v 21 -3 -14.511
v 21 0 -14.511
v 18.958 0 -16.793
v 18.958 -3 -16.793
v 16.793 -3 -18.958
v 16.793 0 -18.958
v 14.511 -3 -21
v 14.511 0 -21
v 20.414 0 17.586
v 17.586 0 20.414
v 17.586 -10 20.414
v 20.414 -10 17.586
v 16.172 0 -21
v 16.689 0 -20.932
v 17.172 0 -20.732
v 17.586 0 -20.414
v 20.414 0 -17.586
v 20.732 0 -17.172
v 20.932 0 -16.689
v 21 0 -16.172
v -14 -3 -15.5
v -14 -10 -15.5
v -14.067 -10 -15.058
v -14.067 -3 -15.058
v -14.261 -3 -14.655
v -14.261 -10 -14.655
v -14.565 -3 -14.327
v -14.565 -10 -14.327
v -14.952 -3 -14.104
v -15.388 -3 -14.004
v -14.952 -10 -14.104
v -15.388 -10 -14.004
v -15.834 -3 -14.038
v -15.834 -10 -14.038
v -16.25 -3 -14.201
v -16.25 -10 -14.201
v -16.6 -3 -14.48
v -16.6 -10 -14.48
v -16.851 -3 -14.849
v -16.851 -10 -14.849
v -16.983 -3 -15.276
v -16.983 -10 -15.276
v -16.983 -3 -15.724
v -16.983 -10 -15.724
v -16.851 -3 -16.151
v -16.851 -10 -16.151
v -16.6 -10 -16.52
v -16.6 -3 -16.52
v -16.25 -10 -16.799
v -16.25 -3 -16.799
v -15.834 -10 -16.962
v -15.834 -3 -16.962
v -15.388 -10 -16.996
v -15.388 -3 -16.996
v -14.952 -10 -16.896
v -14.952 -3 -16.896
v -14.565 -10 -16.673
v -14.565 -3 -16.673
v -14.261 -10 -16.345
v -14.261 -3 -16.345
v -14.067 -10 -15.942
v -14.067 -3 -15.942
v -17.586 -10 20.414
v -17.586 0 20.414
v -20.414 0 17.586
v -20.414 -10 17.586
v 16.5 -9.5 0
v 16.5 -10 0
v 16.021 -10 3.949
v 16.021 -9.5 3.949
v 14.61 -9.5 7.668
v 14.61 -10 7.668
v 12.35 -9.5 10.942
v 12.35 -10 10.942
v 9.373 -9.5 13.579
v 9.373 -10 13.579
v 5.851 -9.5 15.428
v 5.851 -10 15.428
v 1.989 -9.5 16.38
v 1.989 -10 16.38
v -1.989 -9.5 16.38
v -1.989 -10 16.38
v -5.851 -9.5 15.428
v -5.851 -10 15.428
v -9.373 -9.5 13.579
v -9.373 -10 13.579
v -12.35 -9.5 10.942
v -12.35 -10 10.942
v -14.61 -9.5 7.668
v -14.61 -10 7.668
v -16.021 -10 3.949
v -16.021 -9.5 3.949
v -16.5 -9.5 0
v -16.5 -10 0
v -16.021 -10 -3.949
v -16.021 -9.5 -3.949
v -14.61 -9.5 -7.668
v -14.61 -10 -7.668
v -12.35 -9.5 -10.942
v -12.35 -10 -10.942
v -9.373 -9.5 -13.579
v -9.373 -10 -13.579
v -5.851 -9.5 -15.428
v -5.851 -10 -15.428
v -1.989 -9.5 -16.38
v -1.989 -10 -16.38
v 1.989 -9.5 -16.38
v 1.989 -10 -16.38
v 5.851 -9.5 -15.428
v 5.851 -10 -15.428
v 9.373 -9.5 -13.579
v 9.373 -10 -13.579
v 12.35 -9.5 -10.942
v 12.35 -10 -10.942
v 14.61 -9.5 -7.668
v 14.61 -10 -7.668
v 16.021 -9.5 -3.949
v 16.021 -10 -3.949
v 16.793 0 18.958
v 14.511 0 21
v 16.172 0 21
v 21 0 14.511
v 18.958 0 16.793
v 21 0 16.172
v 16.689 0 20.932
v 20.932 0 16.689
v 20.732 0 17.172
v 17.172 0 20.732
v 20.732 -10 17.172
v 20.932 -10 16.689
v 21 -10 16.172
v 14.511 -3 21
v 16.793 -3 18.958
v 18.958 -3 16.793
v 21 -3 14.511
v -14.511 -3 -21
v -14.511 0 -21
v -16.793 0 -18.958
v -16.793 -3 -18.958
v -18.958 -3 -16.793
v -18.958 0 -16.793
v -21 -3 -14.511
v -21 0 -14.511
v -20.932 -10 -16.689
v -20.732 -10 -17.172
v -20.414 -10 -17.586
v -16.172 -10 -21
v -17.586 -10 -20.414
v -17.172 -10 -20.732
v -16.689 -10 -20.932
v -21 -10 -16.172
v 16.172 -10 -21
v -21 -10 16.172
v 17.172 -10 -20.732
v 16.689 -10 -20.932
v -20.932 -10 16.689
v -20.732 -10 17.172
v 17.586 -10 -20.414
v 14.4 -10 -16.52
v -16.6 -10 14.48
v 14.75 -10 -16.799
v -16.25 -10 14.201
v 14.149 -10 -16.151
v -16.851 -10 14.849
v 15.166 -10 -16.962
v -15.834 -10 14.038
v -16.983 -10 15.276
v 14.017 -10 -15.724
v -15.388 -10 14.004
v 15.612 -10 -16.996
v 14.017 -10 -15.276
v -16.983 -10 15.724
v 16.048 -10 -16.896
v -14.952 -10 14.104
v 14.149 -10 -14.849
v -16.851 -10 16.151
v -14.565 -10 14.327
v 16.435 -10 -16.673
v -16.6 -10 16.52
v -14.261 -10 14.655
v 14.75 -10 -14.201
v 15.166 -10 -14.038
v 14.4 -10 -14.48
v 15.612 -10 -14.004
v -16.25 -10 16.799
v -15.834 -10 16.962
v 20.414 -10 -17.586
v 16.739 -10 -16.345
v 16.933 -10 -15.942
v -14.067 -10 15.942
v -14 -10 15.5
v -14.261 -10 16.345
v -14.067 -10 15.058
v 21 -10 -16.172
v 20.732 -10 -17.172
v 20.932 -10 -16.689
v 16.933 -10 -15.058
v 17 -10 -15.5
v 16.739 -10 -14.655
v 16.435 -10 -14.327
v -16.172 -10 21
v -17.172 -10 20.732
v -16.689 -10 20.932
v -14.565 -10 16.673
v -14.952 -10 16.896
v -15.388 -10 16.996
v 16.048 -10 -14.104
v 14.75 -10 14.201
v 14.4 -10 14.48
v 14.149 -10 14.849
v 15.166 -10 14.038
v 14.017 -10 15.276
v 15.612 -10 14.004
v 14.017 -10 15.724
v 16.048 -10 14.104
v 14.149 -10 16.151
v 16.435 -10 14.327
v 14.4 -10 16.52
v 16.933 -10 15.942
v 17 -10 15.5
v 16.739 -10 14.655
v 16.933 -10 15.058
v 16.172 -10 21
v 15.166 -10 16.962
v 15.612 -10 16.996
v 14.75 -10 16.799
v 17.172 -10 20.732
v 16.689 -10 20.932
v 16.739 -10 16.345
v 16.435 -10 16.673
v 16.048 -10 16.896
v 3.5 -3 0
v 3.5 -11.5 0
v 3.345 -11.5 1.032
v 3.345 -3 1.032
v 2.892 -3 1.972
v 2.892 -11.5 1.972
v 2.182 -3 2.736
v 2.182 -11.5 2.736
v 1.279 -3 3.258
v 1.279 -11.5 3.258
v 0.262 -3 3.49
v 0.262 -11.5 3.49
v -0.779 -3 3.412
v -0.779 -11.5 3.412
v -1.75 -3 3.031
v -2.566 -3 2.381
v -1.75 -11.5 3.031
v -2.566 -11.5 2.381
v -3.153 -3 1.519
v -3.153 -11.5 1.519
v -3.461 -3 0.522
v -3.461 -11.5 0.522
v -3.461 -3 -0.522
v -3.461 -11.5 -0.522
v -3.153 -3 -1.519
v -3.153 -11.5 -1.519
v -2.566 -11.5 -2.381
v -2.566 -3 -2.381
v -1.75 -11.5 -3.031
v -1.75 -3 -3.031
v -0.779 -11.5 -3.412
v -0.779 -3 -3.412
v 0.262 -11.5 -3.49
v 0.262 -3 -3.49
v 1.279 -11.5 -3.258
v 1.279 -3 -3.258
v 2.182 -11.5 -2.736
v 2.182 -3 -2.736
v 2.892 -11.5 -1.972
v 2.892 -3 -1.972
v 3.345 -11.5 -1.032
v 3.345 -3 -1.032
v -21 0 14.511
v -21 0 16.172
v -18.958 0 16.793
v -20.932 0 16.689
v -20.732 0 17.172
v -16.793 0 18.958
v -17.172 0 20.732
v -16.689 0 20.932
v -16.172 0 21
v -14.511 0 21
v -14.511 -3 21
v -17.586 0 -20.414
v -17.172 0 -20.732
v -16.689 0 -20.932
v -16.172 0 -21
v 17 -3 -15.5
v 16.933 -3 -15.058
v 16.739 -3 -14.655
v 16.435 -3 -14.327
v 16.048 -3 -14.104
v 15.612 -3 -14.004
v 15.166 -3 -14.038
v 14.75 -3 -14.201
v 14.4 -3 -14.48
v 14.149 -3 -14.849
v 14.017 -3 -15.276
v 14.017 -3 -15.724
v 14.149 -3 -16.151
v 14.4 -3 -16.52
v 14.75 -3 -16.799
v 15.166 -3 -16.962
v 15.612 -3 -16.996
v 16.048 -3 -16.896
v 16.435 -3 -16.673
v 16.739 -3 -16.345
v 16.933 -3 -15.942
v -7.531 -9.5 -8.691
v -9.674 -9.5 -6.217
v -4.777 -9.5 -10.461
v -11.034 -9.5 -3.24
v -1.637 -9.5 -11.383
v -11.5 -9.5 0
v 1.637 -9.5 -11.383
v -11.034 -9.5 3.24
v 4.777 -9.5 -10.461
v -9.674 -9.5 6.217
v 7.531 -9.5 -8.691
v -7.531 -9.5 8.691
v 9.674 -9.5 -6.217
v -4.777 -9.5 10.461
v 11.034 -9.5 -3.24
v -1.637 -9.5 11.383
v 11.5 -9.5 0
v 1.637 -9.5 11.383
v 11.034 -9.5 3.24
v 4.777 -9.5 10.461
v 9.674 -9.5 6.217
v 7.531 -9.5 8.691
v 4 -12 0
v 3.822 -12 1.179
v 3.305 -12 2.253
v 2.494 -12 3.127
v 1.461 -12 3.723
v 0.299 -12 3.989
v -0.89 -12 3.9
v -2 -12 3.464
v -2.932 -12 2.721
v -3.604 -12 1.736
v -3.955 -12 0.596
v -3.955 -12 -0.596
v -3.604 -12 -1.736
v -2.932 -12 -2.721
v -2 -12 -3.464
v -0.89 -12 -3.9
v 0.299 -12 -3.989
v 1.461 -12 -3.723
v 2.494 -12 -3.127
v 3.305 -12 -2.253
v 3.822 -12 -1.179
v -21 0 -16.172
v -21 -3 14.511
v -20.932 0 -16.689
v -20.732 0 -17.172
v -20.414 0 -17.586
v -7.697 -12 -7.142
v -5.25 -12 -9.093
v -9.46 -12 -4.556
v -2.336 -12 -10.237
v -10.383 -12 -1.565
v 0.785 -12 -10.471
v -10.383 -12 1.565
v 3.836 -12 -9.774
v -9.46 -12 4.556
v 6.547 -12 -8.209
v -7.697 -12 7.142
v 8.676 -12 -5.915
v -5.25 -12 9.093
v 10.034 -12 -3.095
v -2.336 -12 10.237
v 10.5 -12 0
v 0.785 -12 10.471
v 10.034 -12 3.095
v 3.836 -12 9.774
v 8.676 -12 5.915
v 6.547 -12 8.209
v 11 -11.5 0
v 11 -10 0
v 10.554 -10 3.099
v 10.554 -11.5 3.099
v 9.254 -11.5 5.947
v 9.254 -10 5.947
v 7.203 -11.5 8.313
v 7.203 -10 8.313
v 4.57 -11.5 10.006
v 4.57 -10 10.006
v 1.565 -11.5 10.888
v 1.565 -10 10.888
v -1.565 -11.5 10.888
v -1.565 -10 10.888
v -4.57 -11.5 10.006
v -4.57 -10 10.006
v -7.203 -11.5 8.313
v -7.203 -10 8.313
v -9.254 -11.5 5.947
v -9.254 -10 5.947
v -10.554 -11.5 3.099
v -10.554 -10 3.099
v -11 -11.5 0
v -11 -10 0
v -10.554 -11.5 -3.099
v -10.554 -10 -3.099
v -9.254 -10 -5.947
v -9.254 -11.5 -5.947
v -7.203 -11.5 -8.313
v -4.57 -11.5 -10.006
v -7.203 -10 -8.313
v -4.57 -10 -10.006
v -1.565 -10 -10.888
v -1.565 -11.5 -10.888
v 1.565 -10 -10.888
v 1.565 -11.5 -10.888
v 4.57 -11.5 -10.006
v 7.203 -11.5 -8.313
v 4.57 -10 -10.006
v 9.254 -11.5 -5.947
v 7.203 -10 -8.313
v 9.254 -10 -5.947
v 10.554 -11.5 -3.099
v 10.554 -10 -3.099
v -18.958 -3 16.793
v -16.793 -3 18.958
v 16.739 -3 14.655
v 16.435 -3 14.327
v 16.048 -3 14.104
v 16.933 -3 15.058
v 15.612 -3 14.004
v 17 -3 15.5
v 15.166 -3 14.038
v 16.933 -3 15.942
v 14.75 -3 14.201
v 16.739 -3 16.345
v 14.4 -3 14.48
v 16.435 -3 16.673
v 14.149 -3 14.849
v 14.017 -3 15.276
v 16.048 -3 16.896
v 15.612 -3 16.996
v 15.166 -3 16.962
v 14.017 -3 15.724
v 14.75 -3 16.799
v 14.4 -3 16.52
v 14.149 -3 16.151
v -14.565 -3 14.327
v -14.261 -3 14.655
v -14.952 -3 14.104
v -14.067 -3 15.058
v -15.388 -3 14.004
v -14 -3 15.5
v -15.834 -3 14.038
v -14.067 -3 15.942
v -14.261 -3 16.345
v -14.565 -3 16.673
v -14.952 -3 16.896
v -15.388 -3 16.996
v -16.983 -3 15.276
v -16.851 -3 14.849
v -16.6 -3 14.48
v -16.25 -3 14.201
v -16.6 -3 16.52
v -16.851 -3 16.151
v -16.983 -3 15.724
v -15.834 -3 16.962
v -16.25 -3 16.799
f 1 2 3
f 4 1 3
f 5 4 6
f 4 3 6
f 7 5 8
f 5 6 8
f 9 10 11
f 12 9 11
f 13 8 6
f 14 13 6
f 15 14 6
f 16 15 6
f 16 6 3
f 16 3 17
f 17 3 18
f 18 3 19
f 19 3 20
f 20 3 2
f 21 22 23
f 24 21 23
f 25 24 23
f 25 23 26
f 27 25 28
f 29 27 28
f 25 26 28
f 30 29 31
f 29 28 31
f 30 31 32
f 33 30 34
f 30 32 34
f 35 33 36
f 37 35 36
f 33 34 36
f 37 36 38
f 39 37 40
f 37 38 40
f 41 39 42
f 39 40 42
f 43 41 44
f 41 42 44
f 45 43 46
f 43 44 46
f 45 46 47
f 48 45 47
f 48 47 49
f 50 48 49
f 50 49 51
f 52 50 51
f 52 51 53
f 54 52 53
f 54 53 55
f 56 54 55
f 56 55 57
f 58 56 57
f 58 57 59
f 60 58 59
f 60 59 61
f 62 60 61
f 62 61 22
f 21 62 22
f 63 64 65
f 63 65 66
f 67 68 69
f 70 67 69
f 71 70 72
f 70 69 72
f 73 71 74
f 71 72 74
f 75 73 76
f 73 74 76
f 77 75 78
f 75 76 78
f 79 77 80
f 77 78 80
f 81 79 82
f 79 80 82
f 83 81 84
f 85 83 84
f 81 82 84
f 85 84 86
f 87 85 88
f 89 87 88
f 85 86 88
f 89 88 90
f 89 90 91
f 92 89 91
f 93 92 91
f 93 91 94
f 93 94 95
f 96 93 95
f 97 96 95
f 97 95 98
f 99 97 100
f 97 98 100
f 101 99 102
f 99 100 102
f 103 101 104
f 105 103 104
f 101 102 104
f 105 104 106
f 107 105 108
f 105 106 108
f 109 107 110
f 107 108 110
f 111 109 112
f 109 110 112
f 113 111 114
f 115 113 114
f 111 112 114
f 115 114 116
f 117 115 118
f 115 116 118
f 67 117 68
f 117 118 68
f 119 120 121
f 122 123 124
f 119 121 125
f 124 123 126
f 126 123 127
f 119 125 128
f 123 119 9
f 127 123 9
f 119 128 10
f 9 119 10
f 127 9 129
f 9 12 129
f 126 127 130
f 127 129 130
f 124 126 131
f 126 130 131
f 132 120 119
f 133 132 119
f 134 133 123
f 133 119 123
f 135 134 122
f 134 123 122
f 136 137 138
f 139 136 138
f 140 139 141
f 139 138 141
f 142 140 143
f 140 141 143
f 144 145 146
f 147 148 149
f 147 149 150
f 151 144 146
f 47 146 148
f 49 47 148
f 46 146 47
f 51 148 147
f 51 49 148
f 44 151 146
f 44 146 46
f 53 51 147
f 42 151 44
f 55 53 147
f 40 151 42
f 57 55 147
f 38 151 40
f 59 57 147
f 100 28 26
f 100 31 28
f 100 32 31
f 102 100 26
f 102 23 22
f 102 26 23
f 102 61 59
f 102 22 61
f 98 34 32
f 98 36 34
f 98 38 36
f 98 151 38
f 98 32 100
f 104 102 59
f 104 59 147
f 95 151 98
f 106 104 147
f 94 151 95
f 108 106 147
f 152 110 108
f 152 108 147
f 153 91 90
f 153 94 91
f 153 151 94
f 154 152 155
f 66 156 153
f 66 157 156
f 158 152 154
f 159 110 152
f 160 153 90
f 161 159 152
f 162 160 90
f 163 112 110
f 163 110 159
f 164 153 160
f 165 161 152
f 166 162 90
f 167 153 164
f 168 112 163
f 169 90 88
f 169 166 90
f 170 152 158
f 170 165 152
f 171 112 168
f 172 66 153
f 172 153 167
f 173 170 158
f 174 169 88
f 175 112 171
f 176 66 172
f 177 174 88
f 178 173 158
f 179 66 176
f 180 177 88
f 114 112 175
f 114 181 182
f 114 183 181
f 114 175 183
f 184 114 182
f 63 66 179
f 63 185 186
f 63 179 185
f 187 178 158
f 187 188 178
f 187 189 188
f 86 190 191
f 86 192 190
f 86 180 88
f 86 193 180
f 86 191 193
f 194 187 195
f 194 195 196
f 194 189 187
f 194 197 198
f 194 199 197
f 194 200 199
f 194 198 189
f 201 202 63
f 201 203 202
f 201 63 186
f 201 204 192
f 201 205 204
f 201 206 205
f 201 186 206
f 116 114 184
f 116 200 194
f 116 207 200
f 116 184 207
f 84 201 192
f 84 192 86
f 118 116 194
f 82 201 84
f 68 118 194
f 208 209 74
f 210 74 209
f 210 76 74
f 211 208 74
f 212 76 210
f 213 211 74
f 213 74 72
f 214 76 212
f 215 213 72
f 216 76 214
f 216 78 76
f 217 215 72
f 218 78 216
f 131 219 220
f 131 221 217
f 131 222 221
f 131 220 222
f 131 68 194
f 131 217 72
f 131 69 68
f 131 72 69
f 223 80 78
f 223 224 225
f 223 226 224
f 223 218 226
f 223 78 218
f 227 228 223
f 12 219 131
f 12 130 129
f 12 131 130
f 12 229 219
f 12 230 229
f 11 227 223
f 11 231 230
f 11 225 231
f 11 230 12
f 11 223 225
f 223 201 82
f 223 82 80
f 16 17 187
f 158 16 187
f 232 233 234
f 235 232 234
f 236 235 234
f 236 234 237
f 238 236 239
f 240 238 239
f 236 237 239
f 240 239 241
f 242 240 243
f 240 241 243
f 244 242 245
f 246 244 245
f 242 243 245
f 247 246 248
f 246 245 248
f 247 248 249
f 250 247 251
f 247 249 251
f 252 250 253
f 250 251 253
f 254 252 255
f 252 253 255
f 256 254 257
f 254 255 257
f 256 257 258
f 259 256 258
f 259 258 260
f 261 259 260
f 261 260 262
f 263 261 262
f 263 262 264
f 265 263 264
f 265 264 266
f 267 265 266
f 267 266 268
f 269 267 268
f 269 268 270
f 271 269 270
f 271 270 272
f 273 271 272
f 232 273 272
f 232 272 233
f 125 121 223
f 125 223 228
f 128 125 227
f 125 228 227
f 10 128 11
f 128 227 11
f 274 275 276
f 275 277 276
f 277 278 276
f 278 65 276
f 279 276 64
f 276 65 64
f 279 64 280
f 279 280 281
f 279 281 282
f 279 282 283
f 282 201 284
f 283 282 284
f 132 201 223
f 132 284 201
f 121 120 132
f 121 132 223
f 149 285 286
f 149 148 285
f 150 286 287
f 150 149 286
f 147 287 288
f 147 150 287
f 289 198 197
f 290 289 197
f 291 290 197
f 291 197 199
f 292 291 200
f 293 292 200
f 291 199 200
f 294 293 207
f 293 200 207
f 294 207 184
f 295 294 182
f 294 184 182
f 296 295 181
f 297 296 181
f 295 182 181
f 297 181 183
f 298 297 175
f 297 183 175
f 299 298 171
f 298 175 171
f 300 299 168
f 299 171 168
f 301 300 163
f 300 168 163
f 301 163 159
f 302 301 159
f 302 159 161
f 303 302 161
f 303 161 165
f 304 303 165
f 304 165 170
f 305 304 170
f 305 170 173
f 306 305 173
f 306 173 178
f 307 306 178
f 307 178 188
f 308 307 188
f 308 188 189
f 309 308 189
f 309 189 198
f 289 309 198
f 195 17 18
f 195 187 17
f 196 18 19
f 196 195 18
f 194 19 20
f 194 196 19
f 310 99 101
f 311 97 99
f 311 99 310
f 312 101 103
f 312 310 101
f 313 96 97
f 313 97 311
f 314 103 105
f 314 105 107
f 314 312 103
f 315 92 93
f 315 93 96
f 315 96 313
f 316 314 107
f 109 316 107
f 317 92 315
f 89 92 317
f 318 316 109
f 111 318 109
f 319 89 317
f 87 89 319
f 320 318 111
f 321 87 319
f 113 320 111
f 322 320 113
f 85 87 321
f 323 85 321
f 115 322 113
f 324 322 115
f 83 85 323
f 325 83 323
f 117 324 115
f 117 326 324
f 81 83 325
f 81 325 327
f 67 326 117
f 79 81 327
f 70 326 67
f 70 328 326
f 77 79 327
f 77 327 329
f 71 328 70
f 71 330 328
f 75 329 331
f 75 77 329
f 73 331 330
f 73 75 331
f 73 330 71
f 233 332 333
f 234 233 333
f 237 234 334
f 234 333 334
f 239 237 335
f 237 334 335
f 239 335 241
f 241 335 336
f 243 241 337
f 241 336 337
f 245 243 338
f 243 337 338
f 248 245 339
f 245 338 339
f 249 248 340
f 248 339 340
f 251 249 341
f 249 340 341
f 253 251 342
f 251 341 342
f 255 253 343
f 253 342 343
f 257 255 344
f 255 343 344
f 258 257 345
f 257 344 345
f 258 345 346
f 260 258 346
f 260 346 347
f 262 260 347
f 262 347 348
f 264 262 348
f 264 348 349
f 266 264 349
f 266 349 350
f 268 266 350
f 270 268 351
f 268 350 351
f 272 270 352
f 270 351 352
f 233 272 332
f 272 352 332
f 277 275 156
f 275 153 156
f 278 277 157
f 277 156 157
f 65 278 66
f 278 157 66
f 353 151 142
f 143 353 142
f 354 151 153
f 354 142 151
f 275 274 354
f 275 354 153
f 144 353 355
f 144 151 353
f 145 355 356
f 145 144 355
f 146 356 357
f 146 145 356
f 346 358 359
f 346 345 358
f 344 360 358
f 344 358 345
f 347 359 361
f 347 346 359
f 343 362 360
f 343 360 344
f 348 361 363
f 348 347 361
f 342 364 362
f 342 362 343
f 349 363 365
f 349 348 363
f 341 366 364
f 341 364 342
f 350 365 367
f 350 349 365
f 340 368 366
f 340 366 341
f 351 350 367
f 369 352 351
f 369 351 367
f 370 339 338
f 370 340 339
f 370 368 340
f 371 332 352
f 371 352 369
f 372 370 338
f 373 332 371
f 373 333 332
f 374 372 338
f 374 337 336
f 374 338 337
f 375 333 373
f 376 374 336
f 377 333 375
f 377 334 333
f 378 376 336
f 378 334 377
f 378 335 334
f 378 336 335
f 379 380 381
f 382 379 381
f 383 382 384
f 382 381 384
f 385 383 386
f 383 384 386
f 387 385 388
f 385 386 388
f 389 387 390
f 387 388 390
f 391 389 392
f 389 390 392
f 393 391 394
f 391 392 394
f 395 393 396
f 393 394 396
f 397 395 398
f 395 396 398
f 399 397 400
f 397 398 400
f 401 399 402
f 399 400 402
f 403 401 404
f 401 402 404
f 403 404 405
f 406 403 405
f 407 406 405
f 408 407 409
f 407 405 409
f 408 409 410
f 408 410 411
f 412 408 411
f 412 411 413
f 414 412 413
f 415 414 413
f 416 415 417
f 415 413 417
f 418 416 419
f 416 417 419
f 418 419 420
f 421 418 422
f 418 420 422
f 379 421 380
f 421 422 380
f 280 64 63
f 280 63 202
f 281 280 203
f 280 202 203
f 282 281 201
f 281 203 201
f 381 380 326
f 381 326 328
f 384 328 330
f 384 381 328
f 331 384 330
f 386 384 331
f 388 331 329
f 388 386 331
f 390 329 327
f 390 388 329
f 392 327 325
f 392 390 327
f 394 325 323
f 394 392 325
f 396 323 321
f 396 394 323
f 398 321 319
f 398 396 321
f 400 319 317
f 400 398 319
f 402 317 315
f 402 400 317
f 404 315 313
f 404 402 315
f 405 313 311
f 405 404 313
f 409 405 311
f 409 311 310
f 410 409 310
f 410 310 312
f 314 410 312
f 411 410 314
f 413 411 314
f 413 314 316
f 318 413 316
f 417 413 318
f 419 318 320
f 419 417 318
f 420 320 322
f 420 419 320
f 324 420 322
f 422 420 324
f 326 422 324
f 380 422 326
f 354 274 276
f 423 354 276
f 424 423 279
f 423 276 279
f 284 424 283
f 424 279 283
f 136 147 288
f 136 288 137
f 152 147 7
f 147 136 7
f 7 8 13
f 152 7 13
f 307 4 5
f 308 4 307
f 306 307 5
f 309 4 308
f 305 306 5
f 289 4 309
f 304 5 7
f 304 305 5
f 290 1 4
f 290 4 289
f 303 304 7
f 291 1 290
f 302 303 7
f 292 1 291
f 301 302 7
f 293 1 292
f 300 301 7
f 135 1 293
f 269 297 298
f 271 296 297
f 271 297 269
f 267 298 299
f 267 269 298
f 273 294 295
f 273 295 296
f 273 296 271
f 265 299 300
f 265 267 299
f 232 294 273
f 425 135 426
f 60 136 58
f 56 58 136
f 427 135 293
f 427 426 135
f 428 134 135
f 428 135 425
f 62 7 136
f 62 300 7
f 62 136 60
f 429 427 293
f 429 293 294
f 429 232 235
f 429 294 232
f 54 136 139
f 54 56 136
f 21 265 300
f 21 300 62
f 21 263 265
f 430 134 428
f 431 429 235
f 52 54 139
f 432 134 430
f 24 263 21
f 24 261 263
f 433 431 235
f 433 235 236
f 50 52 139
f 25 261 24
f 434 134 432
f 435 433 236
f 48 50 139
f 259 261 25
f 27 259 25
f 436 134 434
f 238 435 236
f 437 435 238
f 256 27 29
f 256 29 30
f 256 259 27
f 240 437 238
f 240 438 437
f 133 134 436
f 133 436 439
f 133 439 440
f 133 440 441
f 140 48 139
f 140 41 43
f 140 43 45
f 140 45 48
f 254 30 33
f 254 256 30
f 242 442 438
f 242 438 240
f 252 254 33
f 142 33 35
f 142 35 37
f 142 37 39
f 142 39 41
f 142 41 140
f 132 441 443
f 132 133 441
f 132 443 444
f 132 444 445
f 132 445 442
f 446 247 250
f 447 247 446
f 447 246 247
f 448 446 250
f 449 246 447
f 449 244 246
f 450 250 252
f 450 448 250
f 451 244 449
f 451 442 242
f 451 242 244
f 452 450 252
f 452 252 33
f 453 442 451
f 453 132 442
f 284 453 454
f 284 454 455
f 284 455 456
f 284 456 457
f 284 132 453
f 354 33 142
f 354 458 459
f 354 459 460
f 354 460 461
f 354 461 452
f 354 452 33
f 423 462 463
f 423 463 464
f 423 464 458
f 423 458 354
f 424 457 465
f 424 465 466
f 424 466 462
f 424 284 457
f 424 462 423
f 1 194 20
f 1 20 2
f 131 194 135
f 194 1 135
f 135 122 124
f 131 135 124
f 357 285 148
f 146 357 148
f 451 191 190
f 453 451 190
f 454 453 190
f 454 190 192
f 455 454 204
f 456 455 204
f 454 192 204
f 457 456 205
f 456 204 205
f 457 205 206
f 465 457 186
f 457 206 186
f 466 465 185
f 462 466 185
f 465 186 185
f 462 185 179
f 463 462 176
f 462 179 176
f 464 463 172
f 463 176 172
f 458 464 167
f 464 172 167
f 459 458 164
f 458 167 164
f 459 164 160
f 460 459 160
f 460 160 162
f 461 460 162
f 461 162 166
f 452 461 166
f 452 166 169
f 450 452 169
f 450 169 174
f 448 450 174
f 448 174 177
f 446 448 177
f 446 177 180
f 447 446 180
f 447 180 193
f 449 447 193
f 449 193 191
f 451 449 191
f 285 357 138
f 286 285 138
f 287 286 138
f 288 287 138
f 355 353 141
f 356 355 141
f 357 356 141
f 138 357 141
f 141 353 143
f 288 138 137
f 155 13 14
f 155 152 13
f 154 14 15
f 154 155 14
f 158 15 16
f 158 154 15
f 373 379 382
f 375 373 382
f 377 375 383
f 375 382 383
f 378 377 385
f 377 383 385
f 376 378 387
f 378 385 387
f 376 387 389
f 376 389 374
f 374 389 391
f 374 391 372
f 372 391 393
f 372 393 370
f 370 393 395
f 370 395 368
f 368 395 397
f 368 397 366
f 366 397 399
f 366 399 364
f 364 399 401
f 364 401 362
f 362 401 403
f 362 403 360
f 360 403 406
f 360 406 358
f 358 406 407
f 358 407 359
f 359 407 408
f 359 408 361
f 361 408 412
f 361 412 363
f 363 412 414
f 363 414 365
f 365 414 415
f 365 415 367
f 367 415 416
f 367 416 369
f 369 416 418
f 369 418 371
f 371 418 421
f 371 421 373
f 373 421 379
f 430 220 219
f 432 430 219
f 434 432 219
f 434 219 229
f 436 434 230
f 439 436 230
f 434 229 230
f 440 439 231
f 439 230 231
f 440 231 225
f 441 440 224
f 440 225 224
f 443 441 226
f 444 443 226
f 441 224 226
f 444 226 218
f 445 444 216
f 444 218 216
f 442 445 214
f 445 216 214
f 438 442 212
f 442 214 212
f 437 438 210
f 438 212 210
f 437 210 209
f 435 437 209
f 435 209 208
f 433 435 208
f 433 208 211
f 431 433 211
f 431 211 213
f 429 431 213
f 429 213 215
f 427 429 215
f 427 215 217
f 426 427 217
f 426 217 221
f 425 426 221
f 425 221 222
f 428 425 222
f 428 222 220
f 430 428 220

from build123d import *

# Parameters (mm, degrees)
F0_W      = 42
F0_H      = 42
F1_DEPTH  = 10
F2_SIZE   = 4
F3_R      = 16.5
F4_DEPTH  = 0.5
F5_R      = 11
F6_DEPTH  = 2.5
F7_R      = 3.5
F8_DEPTH  = 12.001
F9_R      = 2
F10_SIZE  = 0.5
F12_DEPTH = 3
F13_R     = 1.5
F14_DEPTH = 10.001


with BuildPart() as f1:
    # F0 (on Front) → F1 (new body)
    with BuildSketch(Plane.XZ):
        Rectangle(F0_W, F0_H)
    extrude(amount=F1_DEPTH)

    # F2
    f2_edges = [f1.edges().sort_by_distance(p)[0] for p in [
        (-21, -5, 21),
        (21, -5, 21),
        (21, -5, -21),
        (-21, -5, -21),
    ]]
    chamfer(f2_edges, length=F2_SIZE)

    # F3 (on face) → F4 (cut)
    with BuildSketch(Plane.XZ.offset(10)):
        Circle(F3_R)
    extrude(amount=-F4_DEPTH, mode=Mode.SUBTRACT)

    # F5 (on face) → F6 (join)
    with BuildSketch(Plane.XZ.offset(9.5)):
        Circle(F5_R)
    extrude(amount=F6_DEPTH)

    # F7 (on face) → F8 (cut, through all)
    with BuildSketch(Plane.XZ.offset(12)):
        Circle(F7_R)
    extrude(amount=-F8_DEPTH, mode=Mode.SUBTRACT)

    # F9
    f9_edges = [f1.edges().sort_by_distance(p)[0] for p in [
        (-17, -5, 21),
        (17, -5, 21),
        (21, -5, 17),
        (21, -5, -17),
        (17, -5, -21),
        (-17, -5, -21),
        (-21, -5, -17),
        (-21, -5, 17),
    ]]
    fillet(f9_edges, radius=F9_R)

    # F10
    f10_edges = [f1.edges().sort_by_distance(p)[0] for p in [
        (-11, -12, 0),
        (-3.5, -12, 0),
        (-11, -9.5, 0),
    ]]
    chamfer(f10_edges, length=F10_SIZE)

    # F11 (on face) → F12 (cut)
    with BuildSketch(Plane(origin=(0, 0, 0), x_dir=(-1, 0, 0), z_dir=(0, 1, 0))):
        with BuildLine():
            ThreePointArc((-14.5105618091, 21), (-17.8908729653, 17.8908729653), (-21, 14.5105618091))
            Line((-21, 14.5105618091), (-21, -14.5105618091))
            ThreePointArc((-21, -14.5105618091), (-17.8908729653, -17.8908729653), (-14.5105618091, -21))
            Line((-14.5105618091, -21), (14.5105618091, -21))
            ThreePointArc((14.5105618091, -21), (17.8908729653, -17.8908729653), (21, -14.5105618091))
            Line((21, -14.5105618091), (21, 14.5105618091))
            ThreePointArc((21, 14.5105618091), (17.8908729653, 17.8908729653), (14.5105618091, 21))
            Line((14.5105618091, 21), (-14.5105618091, 21))
        make_face()
    extrude(amount=-F12_DEPTH, mode=Mode.SUBTRACT)

    # F13 (on face) → F14 (cut, through all)
    with BuildSketch(Plane.XZ.offset(10)):
        with Locations((-15.5, 15.5)):
            Circle(F13_R)
        with Locations((-15.5, -15.5)):
            Circle(F13_R)
        with Locations((15.5, -15.5)):
            Circle(F13_R)
        with Locations((15.5, 15.5)):
            Circle(F13_R)
    extrude(amount=-F14_DEPTH, mode=Mode.SUBTRACT)


solid = f1.part
